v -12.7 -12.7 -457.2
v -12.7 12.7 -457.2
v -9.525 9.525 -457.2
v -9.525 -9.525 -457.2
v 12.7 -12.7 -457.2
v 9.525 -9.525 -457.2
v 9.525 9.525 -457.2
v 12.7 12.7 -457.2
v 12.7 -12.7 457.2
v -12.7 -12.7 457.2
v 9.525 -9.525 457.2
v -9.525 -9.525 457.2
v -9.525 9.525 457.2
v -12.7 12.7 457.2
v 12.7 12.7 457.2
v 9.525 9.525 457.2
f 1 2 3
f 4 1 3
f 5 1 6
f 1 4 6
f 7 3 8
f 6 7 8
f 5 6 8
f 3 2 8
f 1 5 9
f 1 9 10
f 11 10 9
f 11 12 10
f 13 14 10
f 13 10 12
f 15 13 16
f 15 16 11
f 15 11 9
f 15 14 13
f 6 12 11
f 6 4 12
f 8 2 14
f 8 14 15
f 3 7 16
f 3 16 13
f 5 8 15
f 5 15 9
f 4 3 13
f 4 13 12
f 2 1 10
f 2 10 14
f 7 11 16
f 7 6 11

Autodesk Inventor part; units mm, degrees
ref_plane "YZ Plane" through (0, 0, 0) normal (1, 0, 0) x (0, 1, 0)
ref_plane "XZ Plane" through (0, 0, 0) normal (0, 1, 0) x (-1, 0, 0)
ref_plane "XY Plane" through (0, 0, 0) normal (0, 0, 1) x (1, 0, 0)
sketch "Sketch1" plane through (0, 0, 0) normal (0, 0, 1) x (1, 0, 0)
  line L0 (-17.78, 0) -> (17.78, 0) projected
  line L1 (0, -17.78) -> (0, 17.78) projected
  line L2 (-12.7, 12.7) -> (12.7, 12.7)
  line L3 (12.7, 12.7) -> (12.7, -12.7)
  line L4 (12.7, -12.7) -> (-12.7, -12.7)
  line L5 (-12.7, -12.7) -> (-12.7, 12.7)
  line L6 (9.525, 9.525) -> (-9.525, 9.525)
  line L7 (-9.525, 9.525) -> (-9.525, -9.525)
  line L8 (-9.525, -9.525) -> (9.525, -9.525)
  line L9 (9.525, -9.525) -> (9.525, 9.525)
  point P0 (0, 0)
  point P1 (-12.7, 0)
  point P2 (0, 12.7)
  dimension "d0" = 25.4
  dimension "d1" = 3.175
extrude "Extrusion1" add sketch "Sketch1" along normal mid plane 914.4 contours L5 L2 L1 L6 L7 L0 | L0 L7 L8 L1 L4 L5 | L1 L8 L9 L0 L3 L4 | L2 L3 L0 L9 L6 L1
properties part number "tubing_template_0.125" material "Aluminum-6061"
